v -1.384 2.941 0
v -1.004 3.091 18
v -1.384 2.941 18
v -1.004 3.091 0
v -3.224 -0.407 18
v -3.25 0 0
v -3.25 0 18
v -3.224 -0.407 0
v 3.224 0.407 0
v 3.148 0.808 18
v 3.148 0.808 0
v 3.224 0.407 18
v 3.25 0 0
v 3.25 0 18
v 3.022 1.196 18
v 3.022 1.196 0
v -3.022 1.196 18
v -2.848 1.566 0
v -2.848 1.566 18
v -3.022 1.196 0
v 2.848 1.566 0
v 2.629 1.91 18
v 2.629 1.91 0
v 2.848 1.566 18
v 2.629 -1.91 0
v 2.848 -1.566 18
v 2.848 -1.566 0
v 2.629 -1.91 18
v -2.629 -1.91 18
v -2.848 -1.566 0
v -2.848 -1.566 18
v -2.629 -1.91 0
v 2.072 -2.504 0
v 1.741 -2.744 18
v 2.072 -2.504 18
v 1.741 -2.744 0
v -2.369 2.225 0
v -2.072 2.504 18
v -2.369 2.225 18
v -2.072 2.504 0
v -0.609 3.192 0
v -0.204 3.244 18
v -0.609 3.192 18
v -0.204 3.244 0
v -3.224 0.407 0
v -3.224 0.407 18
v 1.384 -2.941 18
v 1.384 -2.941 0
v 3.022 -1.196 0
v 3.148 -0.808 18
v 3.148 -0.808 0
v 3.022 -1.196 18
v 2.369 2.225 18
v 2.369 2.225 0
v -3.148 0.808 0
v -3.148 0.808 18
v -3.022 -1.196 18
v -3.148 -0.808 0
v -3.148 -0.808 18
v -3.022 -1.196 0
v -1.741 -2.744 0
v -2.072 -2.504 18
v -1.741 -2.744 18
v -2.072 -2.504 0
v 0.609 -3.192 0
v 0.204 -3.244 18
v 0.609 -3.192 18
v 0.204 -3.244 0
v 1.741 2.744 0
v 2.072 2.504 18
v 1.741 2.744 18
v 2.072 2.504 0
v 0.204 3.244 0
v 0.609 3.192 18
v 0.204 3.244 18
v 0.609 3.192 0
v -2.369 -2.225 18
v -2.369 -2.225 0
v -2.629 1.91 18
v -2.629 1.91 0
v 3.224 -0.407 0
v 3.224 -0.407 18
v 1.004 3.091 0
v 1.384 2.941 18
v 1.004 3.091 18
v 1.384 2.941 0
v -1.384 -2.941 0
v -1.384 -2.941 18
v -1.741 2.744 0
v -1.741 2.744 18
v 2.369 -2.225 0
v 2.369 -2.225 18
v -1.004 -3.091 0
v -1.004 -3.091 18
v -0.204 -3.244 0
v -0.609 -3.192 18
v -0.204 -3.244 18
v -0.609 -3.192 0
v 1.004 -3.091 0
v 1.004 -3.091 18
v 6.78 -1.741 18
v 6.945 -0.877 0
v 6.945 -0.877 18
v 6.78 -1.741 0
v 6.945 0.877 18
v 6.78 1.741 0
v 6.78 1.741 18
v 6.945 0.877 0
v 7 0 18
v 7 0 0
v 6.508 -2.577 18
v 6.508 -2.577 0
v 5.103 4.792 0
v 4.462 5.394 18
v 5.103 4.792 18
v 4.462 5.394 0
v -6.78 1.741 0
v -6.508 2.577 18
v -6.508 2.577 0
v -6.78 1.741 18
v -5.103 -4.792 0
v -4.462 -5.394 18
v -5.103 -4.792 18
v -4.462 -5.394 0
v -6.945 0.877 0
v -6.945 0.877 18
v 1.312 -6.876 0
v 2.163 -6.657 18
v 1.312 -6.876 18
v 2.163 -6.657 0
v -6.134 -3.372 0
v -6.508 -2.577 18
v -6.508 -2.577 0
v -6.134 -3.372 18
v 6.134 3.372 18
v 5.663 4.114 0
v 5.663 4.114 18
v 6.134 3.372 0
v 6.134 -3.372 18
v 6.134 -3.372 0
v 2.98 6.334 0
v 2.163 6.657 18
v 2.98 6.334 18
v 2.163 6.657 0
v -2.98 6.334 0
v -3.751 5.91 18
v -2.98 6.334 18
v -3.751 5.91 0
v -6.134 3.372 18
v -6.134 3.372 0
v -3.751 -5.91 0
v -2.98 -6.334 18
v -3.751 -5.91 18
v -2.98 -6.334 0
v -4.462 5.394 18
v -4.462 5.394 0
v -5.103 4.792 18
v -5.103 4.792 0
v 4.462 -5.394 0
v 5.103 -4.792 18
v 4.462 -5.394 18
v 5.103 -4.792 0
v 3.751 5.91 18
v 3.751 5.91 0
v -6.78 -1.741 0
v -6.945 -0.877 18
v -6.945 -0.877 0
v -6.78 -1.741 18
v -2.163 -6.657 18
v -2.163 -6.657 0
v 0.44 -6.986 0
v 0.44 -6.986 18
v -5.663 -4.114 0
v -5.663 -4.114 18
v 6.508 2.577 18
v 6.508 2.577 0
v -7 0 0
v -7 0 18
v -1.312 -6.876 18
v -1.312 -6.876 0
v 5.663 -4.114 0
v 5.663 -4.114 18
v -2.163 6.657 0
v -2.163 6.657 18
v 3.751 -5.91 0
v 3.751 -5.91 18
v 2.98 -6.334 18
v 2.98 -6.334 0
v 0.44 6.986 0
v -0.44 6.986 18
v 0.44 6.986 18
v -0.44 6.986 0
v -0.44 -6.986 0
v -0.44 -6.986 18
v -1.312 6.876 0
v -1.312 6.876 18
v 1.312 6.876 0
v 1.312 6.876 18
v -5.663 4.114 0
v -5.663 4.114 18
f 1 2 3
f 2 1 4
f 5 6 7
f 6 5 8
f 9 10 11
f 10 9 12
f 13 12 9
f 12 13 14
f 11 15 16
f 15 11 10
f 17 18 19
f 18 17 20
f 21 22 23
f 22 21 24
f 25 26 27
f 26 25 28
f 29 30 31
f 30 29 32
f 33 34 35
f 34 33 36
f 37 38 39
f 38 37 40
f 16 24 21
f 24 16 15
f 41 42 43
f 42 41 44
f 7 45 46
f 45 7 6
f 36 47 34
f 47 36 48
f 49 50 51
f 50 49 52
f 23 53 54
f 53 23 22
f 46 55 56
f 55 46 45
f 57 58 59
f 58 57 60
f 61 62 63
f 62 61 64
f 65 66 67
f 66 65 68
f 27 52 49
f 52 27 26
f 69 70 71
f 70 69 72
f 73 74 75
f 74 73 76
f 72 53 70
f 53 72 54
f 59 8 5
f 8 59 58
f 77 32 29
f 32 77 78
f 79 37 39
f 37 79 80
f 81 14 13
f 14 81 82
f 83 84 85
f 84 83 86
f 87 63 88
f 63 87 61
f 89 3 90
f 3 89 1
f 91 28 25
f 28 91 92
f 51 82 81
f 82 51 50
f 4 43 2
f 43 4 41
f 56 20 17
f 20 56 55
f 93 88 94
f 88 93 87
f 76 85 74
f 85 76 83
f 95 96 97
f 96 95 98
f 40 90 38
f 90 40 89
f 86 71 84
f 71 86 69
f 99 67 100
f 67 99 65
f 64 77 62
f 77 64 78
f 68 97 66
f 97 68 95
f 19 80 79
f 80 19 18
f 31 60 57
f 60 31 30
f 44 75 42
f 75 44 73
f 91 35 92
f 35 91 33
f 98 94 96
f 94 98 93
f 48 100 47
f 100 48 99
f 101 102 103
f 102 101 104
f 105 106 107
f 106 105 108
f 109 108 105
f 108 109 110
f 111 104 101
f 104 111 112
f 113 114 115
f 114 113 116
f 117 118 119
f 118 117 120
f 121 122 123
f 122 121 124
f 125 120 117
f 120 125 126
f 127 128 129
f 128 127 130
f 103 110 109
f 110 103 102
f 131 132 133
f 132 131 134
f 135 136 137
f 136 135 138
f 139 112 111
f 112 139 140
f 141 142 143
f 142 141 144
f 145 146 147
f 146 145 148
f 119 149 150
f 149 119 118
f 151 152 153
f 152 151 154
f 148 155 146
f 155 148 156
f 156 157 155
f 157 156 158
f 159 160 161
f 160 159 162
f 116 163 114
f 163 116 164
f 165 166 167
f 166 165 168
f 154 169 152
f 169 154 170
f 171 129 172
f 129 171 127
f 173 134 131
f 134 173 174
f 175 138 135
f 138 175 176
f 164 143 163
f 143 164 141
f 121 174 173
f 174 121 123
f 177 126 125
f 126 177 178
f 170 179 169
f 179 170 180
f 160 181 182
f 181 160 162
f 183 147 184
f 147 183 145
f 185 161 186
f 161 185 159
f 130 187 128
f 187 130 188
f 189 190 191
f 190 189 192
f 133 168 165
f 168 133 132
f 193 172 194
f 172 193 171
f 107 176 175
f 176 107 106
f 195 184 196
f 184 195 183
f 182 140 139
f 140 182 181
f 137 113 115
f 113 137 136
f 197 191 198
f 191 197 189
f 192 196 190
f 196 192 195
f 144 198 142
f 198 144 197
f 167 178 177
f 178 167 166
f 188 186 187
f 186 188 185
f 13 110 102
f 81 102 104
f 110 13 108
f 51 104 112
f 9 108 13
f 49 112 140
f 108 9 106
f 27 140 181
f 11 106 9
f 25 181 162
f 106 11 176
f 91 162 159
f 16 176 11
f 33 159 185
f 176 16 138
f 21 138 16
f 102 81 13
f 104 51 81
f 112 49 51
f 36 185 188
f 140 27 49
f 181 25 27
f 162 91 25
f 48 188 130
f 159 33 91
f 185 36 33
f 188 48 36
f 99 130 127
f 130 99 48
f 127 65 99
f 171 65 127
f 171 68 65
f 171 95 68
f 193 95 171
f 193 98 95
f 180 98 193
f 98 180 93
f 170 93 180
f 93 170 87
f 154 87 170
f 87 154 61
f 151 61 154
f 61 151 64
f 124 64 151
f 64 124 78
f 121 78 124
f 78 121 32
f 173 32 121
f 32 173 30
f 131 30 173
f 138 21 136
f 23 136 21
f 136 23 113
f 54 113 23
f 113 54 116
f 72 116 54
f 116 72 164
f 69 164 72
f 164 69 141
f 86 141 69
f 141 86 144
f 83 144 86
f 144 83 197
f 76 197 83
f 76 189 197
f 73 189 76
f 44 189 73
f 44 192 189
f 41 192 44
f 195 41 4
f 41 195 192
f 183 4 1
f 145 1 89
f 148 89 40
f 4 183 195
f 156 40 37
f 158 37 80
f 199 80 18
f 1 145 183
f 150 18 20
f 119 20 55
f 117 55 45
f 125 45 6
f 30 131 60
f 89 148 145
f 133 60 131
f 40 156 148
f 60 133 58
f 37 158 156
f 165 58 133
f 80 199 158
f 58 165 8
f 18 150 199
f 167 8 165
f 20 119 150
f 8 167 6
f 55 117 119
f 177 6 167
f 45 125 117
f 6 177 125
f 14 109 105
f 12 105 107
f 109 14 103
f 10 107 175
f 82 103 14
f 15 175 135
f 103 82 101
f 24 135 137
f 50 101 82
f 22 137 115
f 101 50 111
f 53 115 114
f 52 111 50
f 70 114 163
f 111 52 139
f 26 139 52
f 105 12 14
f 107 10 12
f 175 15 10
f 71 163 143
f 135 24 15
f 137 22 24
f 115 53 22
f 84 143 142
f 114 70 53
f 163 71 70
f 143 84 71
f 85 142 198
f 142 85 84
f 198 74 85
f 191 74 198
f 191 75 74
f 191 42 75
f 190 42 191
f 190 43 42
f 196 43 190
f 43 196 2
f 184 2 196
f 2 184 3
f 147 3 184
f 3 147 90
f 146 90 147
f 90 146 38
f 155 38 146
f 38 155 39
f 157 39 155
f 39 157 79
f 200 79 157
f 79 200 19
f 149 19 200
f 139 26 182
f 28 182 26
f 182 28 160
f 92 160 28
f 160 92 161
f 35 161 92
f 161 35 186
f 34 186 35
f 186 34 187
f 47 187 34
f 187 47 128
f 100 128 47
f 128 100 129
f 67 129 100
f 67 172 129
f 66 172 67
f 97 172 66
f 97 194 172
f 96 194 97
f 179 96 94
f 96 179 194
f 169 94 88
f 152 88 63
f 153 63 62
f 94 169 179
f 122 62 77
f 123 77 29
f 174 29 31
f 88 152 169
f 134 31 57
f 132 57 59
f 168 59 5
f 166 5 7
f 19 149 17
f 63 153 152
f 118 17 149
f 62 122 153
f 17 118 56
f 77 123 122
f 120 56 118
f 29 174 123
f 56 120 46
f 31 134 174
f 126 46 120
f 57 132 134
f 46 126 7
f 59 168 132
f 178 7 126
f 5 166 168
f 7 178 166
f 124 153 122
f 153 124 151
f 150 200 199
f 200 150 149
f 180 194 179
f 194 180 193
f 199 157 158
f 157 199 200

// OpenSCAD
$fn = 50;


difference() {
	union() {
		cylinder(h = 18, r = 7.0000000000);
	}
	union() {
		translate(v = [0, 0, -100]) {
			cylinder(h = 200, r = 3.2500000000);
		}
		translate(v = [0, 0, -100]) {
			cylinder(h = 200, r = 1.8000000000);
		}
	}
}
